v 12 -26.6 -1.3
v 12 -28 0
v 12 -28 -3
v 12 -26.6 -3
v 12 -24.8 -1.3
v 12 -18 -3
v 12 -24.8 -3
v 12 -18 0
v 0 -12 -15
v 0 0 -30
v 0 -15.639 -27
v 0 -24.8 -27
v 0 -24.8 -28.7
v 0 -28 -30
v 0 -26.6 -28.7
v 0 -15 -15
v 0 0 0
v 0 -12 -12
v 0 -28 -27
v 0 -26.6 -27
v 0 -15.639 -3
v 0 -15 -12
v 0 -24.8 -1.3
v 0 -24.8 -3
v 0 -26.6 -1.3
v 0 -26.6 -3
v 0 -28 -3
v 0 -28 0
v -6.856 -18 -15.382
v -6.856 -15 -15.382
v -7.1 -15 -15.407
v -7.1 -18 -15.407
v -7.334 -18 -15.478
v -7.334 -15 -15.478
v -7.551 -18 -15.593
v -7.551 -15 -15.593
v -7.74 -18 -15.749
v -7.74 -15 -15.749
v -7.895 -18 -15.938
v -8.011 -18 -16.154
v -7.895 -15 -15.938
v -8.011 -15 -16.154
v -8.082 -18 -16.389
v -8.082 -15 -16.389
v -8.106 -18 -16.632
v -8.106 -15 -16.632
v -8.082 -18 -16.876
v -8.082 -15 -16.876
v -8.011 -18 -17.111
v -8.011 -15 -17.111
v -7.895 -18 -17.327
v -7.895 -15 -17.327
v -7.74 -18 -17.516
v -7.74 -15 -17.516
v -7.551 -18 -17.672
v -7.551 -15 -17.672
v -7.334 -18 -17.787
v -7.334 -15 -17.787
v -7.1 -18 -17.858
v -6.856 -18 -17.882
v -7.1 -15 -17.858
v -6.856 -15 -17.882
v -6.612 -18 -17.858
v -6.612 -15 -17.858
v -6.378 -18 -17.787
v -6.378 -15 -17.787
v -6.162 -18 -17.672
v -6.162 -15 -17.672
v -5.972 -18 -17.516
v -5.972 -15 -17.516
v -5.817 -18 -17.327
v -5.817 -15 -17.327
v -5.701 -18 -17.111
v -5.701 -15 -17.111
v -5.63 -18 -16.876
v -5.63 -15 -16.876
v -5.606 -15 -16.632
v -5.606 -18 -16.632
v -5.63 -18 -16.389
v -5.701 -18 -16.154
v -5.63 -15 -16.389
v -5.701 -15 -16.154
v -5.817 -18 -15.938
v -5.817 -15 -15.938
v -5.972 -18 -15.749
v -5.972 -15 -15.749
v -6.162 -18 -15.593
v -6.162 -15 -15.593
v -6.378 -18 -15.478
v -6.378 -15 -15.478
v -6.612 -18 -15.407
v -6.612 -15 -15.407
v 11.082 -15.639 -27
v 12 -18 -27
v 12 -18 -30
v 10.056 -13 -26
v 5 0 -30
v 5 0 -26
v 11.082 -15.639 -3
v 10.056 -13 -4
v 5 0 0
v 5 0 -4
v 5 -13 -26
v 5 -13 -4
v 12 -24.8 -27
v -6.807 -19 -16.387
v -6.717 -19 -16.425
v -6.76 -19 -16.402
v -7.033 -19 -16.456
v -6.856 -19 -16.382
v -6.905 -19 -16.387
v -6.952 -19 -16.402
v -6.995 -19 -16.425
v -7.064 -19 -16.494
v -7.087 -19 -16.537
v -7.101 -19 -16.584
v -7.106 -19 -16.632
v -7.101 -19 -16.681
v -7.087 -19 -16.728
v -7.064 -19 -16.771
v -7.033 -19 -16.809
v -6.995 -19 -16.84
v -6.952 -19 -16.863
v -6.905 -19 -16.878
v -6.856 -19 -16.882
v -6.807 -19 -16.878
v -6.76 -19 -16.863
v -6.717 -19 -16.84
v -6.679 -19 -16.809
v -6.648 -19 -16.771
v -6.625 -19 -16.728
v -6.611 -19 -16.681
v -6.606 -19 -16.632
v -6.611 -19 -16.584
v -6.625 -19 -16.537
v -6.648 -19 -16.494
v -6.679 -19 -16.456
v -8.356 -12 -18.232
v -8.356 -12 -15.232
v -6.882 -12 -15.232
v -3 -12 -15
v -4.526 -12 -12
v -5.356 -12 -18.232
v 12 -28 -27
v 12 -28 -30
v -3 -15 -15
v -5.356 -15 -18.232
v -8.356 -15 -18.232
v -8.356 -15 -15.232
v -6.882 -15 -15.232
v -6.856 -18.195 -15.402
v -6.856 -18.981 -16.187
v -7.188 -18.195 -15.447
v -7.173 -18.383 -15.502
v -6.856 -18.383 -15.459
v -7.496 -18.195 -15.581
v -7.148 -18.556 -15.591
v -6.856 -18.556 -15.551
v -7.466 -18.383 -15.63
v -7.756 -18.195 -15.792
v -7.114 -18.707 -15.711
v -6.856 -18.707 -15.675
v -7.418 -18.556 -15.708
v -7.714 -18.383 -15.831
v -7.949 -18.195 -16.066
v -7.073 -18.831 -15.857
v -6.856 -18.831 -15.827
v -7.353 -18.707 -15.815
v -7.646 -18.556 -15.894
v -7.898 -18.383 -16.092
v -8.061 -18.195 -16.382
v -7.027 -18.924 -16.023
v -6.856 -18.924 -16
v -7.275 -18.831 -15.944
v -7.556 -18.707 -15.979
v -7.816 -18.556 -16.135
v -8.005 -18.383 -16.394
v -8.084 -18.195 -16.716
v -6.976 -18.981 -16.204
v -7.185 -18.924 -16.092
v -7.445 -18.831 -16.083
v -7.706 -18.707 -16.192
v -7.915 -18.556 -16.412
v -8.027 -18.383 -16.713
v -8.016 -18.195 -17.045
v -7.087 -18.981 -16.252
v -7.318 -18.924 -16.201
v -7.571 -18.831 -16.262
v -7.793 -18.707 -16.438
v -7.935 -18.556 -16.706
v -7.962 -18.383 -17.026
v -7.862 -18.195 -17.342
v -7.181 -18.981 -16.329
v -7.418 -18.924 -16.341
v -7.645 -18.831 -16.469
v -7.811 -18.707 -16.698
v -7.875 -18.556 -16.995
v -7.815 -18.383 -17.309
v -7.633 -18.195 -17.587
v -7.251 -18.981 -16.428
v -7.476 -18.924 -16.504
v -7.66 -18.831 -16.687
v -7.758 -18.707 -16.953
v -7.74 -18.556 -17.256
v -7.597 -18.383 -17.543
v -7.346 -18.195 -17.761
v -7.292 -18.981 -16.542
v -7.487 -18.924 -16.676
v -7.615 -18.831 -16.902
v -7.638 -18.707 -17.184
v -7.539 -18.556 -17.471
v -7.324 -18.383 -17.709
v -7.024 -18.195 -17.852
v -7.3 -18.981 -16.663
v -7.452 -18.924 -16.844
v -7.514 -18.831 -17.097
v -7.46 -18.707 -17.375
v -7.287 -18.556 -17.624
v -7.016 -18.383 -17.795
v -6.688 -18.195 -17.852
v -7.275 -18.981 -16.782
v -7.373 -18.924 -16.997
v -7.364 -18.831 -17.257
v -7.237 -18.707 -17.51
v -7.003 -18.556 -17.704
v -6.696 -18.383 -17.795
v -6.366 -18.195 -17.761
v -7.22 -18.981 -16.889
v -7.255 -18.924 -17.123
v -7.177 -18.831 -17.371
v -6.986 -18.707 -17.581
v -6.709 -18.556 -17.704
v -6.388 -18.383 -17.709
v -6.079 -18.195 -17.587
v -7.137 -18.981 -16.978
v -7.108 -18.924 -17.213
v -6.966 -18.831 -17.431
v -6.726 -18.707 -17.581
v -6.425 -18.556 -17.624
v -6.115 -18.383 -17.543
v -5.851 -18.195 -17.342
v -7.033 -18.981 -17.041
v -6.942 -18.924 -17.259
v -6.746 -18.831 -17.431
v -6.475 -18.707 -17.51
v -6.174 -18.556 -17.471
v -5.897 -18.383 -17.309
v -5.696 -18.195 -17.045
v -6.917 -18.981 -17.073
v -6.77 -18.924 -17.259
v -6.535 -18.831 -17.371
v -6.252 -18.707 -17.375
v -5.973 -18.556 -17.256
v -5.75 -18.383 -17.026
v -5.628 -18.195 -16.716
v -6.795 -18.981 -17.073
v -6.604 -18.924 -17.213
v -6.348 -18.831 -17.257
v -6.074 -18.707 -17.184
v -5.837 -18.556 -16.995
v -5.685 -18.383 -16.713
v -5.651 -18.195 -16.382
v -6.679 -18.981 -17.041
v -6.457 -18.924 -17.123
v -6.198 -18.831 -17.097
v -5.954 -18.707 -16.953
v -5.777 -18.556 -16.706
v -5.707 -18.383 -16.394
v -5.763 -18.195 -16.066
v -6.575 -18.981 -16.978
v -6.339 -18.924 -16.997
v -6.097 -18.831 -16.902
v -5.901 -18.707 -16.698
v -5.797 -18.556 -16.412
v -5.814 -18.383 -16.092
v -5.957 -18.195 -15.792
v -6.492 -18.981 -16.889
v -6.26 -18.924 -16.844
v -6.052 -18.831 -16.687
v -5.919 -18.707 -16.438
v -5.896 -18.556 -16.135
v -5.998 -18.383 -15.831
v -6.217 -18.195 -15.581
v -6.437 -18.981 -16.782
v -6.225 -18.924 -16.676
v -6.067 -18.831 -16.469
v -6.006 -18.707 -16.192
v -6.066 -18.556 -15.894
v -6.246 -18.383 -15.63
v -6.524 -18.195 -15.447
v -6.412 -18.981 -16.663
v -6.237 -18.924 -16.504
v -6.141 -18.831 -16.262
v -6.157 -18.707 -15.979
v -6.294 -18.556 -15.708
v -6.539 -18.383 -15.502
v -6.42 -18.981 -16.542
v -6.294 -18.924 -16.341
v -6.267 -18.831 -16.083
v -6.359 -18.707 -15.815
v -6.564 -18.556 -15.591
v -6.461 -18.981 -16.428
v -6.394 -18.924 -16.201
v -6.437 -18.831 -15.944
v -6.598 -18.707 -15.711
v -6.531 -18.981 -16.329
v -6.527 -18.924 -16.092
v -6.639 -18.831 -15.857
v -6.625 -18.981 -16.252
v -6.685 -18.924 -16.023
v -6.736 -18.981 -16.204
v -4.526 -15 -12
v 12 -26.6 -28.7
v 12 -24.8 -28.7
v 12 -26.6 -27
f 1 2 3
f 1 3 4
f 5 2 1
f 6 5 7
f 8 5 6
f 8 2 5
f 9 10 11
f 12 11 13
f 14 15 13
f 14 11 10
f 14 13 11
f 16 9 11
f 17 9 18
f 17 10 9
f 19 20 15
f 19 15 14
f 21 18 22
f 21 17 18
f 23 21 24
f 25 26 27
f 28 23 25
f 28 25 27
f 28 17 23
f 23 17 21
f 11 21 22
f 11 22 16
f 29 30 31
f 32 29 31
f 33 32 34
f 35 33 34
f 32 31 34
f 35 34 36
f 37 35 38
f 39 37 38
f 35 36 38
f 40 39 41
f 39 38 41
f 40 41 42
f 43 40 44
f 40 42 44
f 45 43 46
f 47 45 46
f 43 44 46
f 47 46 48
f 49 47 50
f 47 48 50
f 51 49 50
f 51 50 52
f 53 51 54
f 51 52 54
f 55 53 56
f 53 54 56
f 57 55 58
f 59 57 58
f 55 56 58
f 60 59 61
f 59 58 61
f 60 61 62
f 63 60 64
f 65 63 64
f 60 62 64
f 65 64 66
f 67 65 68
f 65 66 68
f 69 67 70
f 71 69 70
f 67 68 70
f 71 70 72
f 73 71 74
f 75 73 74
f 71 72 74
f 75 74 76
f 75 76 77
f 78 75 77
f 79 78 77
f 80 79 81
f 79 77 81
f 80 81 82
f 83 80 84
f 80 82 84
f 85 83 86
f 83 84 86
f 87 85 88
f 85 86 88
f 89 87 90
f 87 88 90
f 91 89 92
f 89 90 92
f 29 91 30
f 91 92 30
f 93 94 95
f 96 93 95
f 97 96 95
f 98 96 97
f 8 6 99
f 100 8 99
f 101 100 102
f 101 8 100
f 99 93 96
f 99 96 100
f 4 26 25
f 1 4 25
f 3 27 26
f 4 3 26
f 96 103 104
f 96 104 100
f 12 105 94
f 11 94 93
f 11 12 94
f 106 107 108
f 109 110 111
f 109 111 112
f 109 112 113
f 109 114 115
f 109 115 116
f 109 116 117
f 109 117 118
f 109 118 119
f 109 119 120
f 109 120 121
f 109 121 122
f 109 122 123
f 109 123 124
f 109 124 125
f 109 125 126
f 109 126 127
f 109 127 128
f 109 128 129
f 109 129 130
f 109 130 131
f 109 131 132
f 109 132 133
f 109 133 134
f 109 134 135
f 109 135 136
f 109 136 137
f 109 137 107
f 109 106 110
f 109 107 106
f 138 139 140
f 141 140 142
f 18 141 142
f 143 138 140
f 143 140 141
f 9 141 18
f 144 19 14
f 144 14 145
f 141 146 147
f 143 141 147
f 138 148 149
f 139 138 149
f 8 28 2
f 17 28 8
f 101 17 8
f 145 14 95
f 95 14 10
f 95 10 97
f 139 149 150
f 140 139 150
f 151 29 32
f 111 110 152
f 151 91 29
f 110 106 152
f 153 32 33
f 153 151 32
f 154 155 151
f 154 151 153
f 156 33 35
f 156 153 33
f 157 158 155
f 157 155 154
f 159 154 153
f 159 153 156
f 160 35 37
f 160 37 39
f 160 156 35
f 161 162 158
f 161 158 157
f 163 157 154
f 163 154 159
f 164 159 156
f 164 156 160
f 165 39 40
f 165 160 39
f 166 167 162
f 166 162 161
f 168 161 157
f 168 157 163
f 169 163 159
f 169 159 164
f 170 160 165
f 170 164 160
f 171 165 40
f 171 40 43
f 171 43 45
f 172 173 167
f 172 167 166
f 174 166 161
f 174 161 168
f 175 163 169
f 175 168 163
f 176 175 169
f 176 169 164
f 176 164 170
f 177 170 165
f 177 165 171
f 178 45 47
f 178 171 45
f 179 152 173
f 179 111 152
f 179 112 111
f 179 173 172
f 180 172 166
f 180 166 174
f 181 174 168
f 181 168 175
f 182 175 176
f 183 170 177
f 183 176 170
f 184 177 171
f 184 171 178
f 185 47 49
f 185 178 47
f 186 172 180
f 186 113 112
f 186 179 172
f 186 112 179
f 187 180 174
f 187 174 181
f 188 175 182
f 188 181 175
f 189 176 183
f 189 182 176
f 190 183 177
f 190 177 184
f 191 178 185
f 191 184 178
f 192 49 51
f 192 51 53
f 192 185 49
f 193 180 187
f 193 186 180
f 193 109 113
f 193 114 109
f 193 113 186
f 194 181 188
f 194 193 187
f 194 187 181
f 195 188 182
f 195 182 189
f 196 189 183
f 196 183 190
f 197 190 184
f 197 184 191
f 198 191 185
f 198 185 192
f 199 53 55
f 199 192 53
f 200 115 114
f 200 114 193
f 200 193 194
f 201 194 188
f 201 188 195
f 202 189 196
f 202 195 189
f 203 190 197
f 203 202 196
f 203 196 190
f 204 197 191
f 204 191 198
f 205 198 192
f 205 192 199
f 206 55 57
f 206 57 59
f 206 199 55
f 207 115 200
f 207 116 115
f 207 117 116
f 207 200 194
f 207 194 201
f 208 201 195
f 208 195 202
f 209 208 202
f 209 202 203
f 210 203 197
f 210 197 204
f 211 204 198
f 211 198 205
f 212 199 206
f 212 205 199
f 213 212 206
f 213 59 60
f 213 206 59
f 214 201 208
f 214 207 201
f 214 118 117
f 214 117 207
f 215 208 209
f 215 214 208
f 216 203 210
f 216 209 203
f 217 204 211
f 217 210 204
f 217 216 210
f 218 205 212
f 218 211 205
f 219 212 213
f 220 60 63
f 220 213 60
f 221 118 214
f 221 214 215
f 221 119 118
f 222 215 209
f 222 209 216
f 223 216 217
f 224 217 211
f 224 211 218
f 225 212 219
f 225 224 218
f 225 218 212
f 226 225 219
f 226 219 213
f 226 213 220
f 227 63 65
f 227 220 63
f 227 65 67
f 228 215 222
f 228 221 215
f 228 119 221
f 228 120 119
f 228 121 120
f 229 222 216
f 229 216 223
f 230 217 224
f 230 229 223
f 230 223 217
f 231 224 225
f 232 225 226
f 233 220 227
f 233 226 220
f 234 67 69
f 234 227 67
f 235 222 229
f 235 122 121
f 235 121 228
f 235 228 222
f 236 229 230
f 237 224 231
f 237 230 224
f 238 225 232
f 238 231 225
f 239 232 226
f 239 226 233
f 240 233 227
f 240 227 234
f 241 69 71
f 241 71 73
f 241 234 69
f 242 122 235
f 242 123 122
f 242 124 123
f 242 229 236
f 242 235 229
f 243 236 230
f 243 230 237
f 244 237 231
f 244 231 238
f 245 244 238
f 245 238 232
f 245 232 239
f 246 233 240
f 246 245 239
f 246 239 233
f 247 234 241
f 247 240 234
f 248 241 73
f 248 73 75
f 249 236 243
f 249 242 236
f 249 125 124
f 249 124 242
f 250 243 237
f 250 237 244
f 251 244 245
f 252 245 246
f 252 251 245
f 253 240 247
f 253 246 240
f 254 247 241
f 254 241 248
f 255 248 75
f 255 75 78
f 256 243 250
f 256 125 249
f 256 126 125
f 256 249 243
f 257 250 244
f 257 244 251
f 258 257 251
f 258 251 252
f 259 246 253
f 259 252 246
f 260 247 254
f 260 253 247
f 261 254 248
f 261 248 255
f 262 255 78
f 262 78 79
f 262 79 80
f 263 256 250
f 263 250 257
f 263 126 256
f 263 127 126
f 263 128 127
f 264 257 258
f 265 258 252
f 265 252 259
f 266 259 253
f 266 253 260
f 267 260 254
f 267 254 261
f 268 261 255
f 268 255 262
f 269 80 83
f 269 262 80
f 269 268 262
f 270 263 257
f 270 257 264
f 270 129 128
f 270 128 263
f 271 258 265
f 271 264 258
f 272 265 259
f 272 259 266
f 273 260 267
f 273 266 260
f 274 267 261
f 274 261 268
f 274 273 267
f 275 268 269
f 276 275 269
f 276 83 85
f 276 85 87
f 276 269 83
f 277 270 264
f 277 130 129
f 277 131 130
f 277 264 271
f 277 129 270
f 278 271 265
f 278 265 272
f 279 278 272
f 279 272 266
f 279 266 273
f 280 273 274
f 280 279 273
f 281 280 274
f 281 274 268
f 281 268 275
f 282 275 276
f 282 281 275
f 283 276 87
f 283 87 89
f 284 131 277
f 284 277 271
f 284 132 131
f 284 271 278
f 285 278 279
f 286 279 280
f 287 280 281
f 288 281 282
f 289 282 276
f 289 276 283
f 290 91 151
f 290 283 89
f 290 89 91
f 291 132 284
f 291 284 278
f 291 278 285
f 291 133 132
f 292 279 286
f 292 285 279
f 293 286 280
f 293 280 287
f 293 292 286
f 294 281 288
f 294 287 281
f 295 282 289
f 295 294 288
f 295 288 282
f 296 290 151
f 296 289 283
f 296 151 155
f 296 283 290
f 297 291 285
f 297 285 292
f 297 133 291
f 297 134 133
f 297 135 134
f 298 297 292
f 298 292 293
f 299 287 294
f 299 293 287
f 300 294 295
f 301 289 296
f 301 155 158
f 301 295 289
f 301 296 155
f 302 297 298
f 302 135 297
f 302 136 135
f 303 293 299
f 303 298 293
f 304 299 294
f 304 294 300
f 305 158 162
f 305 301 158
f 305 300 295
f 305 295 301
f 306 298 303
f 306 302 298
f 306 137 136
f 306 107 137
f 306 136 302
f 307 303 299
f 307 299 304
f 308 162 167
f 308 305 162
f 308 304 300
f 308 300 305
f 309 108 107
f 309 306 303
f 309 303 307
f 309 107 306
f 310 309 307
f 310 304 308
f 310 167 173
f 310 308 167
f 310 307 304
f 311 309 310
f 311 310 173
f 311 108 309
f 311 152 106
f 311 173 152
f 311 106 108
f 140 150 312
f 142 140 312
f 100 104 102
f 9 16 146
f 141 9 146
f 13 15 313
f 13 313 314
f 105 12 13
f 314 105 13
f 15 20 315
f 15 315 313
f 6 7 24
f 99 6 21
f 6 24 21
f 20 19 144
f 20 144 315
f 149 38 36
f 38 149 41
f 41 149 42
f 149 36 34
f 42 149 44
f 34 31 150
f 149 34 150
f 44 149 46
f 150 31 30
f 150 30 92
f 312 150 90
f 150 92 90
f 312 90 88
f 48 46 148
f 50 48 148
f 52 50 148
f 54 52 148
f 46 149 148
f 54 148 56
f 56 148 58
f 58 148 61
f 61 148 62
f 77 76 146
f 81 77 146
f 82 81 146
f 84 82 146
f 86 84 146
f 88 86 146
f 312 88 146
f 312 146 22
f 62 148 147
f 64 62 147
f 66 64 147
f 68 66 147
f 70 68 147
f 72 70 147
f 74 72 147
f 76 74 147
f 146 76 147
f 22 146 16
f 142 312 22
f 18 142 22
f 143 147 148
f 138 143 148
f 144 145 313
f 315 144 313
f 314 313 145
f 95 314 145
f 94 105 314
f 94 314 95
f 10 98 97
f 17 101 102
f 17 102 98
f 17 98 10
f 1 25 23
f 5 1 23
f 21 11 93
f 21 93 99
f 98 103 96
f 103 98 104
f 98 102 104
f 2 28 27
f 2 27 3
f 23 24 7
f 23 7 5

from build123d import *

# Parameters (mm, degrees)
BOSS_EXTRUDE1_DEPTH = 30
SKETCH4_W           = 24
SKETCH4_H           = 14
CUT_EXTRUDE2_DEPTH  = 25
SKETCH5_W           = 1.7
SKETCH5_H           = 1.8
CUT_EXTRUDE3_DEPTH  = 15
CUT_EXTRUDE4_DEPTH  = 11
BOSS_EXTRUDE2_DEPTH = 3
SKETCH8_R           = 1.25
BOSS_EXTRUDE3_DEPTH = 4
FILLET3_R           = 1


with BuildPart() as part:
    # Sketch1 → Boss-Extrude1 (new body)
    with BuildSketch(Plane.XY):
        Polygon((0, 0), (0, -28), (12, -28), (12, -18), (5, 0), align=None)
    extrude(amount=-BOSS_EXTRUDE1_DEPTH)

    # Sketch4 → Cut-Extrude2 (cut)
    with BuildSketch(Plane.ZY):
        with Locations((-15, -22.638599401)):
            Rectangle(SKETCH4_W, SKETCH4_H)
    extrude(amount=-CUT_EXTRUDE2_DEPTH, mode=Mode.SUBTRACT)

    # Sketch5 → Cut-Extrude3 (cut)
    with BuildSketch(Plane.ZY):
        with Locations((-2.15, -25.7)):
            Rectangle(SKETCH5_W, SKETCH5_H)
    cut_extrude3 = extrude(amount=-CUT_EXTRUDE3_DEPTH, mode=Mode.SUBTRACT)

    # Mirror1: Cut-Extrude3 across plane
    add(cut_extrude3.mirror(Plane.XY.offset(-15)), mode=Mode.SUBTRACT)

    # Sketch6 → Cut-Extrude4 (cut, symmetric)
    with BuildSketch(Plane.XY.offset(-15)):
        Polygon((5, 0), (5, -13), (10.055555556, -13), align=None)
    extrude(amount=CUT_EXTRUDE4_DEPTH, both=True, mode=Mode.SUBTRACT)

    # Sketch7 → Boss-Extrude2 (add)
    with BuildSketch(Plane(origin=(0, -15, 0), x_dir=(1, 0, 0), z_dir=(0, 1, 0))):
        Polygon((0, 15), (-3, 15), (-5.356060357, 18.232488143), (-8.356060357, 18.232488143), (-8.356060357, 15.232488143), (-6.881763998, 15.232488143), (-4.525703641, 12), (0, 12), align=None)
    extrude(amount=BOSS_EXTRUDE2_DEPTH)

    # Sketch8 → Boss-Extrude3 (add)
    with BuildSketch(Plane(origin=(0, -15, 0), x_dir=(-1, 0, 0), z_dir=(0, -1, 0))):
        with Locations(Location((6.856060357, 16.632488143, 0), (0, 0, 270))):
            Circle(SKETCH8_R)
    extrude(amount=BOSS_EXTRUDE3_DEPTH)

    # Fillet3
    fillet3_edges = [part.edges().sort_by_distance(p)[0] for p in [
        (-6.856060357, -19, -17.882488143),
    ]]
    fillet(fillet3_edges, radius=FILLET3_R)


solid = part.part
